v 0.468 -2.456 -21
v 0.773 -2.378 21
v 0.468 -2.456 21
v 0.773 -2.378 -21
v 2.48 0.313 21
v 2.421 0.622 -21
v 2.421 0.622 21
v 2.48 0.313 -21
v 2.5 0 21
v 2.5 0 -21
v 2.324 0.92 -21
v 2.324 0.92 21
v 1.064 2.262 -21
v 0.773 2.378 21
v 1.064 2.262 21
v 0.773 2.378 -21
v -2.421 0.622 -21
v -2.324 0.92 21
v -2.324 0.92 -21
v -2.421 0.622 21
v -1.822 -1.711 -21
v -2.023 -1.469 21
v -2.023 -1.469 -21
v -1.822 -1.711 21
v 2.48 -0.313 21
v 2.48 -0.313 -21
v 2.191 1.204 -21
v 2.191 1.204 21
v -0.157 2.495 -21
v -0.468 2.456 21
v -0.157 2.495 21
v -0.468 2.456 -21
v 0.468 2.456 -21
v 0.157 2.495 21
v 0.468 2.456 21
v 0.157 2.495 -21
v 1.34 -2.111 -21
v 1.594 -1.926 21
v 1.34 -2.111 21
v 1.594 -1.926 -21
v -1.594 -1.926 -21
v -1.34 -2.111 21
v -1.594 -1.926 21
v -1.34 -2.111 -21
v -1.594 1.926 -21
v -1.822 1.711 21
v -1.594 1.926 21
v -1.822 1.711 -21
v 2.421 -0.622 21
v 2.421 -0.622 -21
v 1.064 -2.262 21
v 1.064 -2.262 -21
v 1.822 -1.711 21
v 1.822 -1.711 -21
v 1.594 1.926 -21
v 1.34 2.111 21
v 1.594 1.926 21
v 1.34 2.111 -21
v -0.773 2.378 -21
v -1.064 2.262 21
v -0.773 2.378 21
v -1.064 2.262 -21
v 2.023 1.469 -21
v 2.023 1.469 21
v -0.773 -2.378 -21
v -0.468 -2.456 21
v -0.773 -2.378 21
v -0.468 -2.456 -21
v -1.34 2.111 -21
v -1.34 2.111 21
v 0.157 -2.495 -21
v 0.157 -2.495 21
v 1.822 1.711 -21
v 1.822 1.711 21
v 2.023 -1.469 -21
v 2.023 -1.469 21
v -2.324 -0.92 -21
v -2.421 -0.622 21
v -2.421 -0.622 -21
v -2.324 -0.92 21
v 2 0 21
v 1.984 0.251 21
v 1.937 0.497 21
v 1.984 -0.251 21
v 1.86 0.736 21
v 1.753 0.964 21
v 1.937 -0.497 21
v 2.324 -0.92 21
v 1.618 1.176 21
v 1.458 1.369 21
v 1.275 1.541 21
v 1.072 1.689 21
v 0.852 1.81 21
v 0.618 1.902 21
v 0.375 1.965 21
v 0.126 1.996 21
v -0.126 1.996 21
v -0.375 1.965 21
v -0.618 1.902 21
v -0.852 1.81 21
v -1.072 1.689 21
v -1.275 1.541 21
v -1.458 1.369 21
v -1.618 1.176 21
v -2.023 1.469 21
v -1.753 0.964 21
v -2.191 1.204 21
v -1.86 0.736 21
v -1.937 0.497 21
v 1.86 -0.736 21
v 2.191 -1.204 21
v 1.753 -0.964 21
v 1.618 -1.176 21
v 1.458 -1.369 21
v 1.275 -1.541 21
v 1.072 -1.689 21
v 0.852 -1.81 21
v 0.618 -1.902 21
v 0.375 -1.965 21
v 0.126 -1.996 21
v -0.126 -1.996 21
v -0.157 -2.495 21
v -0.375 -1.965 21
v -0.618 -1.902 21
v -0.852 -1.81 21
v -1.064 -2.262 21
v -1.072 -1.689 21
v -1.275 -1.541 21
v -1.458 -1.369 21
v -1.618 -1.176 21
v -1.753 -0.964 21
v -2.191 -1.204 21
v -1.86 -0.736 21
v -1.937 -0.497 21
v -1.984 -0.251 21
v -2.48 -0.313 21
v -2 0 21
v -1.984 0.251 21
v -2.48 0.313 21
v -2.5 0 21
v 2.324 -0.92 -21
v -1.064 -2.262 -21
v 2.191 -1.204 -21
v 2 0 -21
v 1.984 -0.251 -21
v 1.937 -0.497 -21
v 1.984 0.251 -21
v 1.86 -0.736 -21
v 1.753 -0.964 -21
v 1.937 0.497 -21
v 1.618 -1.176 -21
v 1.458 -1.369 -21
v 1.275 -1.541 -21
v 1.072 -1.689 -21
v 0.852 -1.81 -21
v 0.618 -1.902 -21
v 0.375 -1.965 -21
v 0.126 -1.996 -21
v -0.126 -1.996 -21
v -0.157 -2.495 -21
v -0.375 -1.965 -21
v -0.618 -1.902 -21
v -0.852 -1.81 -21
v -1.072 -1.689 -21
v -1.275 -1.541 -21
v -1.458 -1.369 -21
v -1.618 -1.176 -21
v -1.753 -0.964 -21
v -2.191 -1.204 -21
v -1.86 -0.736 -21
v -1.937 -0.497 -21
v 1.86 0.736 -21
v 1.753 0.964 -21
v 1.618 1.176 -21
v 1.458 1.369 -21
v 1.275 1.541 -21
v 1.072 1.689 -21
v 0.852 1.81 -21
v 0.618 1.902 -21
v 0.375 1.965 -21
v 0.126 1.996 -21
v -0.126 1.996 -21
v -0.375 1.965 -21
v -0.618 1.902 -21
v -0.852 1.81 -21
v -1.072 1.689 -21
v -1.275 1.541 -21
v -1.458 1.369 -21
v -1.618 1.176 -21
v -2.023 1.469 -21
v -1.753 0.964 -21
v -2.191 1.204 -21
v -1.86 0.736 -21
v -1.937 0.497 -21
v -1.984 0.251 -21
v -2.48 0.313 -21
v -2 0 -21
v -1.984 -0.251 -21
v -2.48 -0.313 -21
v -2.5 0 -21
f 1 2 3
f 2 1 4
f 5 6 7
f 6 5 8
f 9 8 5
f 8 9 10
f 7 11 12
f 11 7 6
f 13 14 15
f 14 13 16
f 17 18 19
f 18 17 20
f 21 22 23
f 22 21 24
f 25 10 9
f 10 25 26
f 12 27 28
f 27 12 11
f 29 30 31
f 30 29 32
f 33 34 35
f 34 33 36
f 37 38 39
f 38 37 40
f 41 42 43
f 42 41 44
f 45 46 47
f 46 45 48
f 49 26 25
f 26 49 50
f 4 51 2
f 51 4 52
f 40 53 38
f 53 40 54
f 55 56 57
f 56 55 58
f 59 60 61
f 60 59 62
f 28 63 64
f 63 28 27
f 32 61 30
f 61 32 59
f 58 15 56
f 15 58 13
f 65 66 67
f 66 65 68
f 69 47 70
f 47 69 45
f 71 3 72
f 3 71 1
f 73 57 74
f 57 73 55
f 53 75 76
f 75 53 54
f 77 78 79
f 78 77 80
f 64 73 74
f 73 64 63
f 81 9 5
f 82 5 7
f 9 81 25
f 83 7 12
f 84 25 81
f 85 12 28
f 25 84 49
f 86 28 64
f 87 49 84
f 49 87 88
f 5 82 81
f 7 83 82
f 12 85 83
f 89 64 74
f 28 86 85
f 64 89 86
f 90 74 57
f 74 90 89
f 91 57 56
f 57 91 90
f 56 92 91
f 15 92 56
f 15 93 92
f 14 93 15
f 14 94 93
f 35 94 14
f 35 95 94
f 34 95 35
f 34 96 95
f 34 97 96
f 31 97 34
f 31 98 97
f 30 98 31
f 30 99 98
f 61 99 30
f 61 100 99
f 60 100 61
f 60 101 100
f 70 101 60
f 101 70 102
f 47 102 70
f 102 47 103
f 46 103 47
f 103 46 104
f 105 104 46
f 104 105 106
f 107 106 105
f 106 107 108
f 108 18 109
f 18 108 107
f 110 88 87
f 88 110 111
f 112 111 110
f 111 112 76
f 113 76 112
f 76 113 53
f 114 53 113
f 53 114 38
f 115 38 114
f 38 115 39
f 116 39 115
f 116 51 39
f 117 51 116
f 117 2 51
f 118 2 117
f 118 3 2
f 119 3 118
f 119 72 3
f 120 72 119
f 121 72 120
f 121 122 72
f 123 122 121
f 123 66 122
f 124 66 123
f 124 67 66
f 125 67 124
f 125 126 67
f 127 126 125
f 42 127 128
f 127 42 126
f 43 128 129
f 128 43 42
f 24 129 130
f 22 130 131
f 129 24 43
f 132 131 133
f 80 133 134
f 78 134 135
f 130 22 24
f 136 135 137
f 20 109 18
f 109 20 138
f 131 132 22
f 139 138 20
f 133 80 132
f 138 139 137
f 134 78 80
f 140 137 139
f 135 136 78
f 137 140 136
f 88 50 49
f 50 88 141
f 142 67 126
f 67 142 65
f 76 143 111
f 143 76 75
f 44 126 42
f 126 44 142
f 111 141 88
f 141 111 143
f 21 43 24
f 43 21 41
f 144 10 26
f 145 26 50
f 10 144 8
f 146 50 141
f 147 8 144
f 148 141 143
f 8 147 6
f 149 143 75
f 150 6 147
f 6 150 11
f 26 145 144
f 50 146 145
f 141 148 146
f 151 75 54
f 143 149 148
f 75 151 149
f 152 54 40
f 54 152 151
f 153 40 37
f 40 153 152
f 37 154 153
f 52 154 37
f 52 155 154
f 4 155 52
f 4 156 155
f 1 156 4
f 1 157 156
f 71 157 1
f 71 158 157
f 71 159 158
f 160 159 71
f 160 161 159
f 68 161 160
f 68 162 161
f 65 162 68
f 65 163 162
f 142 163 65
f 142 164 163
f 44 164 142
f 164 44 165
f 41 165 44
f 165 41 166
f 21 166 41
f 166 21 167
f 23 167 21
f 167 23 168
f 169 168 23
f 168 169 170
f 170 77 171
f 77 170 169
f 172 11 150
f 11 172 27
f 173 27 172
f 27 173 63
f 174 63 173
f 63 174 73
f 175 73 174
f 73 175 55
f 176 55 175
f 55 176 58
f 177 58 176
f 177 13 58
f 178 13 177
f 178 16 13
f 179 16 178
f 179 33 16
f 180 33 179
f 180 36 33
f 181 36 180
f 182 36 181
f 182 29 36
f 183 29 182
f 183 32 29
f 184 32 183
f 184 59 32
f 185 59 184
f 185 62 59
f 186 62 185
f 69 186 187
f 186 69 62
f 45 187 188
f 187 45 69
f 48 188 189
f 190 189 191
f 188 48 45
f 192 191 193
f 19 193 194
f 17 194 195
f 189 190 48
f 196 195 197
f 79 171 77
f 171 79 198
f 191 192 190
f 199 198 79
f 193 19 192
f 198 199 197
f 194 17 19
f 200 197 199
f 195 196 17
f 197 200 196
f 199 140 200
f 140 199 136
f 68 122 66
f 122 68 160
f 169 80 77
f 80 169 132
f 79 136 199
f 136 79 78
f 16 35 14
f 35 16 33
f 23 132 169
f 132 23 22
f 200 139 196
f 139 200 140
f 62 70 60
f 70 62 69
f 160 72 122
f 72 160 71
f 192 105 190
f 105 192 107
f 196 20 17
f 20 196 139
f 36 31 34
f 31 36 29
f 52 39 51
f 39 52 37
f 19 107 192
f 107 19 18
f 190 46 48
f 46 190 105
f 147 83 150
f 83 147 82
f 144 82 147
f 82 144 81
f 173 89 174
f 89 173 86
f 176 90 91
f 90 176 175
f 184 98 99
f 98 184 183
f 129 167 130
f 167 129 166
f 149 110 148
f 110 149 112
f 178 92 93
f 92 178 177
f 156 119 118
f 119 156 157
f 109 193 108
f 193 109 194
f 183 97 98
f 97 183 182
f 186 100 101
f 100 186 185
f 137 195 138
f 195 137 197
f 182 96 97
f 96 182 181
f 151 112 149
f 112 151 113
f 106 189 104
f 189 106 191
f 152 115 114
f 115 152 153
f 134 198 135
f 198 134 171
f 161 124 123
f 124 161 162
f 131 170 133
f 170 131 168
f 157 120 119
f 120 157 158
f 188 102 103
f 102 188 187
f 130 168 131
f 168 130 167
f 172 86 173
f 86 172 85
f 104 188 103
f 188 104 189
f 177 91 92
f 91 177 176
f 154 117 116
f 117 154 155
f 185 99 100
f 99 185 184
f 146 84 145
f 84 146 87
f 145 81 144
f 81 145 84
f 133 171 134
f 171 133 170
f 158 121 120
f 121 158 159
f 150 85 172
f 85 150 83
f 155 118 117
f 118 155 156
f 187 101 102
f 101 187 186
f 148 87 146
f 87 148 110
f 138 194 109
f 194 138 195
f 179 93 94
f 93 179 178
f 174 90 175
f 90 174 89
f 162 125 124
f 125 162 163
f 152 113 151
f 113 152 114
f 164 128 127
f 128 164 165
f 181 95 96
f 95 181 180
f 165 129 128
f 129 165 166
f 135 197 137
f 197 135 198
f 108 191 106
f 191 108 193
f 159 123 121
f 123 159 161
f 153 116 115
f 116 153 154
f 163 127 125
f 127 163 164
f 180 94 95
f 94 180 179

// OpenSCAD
$fn = 50;


difference() {
	union() {
		translate(v = [0, 0, -21.0000000000]) {
			cylinder(h = 42, r = 2.5000000000);
		}
	}
	union() {
		translate(v = [0, 0, -100.0000000000]) {
			cylinder(h = 200, r = 2.0000000000);
		}
	}
}
